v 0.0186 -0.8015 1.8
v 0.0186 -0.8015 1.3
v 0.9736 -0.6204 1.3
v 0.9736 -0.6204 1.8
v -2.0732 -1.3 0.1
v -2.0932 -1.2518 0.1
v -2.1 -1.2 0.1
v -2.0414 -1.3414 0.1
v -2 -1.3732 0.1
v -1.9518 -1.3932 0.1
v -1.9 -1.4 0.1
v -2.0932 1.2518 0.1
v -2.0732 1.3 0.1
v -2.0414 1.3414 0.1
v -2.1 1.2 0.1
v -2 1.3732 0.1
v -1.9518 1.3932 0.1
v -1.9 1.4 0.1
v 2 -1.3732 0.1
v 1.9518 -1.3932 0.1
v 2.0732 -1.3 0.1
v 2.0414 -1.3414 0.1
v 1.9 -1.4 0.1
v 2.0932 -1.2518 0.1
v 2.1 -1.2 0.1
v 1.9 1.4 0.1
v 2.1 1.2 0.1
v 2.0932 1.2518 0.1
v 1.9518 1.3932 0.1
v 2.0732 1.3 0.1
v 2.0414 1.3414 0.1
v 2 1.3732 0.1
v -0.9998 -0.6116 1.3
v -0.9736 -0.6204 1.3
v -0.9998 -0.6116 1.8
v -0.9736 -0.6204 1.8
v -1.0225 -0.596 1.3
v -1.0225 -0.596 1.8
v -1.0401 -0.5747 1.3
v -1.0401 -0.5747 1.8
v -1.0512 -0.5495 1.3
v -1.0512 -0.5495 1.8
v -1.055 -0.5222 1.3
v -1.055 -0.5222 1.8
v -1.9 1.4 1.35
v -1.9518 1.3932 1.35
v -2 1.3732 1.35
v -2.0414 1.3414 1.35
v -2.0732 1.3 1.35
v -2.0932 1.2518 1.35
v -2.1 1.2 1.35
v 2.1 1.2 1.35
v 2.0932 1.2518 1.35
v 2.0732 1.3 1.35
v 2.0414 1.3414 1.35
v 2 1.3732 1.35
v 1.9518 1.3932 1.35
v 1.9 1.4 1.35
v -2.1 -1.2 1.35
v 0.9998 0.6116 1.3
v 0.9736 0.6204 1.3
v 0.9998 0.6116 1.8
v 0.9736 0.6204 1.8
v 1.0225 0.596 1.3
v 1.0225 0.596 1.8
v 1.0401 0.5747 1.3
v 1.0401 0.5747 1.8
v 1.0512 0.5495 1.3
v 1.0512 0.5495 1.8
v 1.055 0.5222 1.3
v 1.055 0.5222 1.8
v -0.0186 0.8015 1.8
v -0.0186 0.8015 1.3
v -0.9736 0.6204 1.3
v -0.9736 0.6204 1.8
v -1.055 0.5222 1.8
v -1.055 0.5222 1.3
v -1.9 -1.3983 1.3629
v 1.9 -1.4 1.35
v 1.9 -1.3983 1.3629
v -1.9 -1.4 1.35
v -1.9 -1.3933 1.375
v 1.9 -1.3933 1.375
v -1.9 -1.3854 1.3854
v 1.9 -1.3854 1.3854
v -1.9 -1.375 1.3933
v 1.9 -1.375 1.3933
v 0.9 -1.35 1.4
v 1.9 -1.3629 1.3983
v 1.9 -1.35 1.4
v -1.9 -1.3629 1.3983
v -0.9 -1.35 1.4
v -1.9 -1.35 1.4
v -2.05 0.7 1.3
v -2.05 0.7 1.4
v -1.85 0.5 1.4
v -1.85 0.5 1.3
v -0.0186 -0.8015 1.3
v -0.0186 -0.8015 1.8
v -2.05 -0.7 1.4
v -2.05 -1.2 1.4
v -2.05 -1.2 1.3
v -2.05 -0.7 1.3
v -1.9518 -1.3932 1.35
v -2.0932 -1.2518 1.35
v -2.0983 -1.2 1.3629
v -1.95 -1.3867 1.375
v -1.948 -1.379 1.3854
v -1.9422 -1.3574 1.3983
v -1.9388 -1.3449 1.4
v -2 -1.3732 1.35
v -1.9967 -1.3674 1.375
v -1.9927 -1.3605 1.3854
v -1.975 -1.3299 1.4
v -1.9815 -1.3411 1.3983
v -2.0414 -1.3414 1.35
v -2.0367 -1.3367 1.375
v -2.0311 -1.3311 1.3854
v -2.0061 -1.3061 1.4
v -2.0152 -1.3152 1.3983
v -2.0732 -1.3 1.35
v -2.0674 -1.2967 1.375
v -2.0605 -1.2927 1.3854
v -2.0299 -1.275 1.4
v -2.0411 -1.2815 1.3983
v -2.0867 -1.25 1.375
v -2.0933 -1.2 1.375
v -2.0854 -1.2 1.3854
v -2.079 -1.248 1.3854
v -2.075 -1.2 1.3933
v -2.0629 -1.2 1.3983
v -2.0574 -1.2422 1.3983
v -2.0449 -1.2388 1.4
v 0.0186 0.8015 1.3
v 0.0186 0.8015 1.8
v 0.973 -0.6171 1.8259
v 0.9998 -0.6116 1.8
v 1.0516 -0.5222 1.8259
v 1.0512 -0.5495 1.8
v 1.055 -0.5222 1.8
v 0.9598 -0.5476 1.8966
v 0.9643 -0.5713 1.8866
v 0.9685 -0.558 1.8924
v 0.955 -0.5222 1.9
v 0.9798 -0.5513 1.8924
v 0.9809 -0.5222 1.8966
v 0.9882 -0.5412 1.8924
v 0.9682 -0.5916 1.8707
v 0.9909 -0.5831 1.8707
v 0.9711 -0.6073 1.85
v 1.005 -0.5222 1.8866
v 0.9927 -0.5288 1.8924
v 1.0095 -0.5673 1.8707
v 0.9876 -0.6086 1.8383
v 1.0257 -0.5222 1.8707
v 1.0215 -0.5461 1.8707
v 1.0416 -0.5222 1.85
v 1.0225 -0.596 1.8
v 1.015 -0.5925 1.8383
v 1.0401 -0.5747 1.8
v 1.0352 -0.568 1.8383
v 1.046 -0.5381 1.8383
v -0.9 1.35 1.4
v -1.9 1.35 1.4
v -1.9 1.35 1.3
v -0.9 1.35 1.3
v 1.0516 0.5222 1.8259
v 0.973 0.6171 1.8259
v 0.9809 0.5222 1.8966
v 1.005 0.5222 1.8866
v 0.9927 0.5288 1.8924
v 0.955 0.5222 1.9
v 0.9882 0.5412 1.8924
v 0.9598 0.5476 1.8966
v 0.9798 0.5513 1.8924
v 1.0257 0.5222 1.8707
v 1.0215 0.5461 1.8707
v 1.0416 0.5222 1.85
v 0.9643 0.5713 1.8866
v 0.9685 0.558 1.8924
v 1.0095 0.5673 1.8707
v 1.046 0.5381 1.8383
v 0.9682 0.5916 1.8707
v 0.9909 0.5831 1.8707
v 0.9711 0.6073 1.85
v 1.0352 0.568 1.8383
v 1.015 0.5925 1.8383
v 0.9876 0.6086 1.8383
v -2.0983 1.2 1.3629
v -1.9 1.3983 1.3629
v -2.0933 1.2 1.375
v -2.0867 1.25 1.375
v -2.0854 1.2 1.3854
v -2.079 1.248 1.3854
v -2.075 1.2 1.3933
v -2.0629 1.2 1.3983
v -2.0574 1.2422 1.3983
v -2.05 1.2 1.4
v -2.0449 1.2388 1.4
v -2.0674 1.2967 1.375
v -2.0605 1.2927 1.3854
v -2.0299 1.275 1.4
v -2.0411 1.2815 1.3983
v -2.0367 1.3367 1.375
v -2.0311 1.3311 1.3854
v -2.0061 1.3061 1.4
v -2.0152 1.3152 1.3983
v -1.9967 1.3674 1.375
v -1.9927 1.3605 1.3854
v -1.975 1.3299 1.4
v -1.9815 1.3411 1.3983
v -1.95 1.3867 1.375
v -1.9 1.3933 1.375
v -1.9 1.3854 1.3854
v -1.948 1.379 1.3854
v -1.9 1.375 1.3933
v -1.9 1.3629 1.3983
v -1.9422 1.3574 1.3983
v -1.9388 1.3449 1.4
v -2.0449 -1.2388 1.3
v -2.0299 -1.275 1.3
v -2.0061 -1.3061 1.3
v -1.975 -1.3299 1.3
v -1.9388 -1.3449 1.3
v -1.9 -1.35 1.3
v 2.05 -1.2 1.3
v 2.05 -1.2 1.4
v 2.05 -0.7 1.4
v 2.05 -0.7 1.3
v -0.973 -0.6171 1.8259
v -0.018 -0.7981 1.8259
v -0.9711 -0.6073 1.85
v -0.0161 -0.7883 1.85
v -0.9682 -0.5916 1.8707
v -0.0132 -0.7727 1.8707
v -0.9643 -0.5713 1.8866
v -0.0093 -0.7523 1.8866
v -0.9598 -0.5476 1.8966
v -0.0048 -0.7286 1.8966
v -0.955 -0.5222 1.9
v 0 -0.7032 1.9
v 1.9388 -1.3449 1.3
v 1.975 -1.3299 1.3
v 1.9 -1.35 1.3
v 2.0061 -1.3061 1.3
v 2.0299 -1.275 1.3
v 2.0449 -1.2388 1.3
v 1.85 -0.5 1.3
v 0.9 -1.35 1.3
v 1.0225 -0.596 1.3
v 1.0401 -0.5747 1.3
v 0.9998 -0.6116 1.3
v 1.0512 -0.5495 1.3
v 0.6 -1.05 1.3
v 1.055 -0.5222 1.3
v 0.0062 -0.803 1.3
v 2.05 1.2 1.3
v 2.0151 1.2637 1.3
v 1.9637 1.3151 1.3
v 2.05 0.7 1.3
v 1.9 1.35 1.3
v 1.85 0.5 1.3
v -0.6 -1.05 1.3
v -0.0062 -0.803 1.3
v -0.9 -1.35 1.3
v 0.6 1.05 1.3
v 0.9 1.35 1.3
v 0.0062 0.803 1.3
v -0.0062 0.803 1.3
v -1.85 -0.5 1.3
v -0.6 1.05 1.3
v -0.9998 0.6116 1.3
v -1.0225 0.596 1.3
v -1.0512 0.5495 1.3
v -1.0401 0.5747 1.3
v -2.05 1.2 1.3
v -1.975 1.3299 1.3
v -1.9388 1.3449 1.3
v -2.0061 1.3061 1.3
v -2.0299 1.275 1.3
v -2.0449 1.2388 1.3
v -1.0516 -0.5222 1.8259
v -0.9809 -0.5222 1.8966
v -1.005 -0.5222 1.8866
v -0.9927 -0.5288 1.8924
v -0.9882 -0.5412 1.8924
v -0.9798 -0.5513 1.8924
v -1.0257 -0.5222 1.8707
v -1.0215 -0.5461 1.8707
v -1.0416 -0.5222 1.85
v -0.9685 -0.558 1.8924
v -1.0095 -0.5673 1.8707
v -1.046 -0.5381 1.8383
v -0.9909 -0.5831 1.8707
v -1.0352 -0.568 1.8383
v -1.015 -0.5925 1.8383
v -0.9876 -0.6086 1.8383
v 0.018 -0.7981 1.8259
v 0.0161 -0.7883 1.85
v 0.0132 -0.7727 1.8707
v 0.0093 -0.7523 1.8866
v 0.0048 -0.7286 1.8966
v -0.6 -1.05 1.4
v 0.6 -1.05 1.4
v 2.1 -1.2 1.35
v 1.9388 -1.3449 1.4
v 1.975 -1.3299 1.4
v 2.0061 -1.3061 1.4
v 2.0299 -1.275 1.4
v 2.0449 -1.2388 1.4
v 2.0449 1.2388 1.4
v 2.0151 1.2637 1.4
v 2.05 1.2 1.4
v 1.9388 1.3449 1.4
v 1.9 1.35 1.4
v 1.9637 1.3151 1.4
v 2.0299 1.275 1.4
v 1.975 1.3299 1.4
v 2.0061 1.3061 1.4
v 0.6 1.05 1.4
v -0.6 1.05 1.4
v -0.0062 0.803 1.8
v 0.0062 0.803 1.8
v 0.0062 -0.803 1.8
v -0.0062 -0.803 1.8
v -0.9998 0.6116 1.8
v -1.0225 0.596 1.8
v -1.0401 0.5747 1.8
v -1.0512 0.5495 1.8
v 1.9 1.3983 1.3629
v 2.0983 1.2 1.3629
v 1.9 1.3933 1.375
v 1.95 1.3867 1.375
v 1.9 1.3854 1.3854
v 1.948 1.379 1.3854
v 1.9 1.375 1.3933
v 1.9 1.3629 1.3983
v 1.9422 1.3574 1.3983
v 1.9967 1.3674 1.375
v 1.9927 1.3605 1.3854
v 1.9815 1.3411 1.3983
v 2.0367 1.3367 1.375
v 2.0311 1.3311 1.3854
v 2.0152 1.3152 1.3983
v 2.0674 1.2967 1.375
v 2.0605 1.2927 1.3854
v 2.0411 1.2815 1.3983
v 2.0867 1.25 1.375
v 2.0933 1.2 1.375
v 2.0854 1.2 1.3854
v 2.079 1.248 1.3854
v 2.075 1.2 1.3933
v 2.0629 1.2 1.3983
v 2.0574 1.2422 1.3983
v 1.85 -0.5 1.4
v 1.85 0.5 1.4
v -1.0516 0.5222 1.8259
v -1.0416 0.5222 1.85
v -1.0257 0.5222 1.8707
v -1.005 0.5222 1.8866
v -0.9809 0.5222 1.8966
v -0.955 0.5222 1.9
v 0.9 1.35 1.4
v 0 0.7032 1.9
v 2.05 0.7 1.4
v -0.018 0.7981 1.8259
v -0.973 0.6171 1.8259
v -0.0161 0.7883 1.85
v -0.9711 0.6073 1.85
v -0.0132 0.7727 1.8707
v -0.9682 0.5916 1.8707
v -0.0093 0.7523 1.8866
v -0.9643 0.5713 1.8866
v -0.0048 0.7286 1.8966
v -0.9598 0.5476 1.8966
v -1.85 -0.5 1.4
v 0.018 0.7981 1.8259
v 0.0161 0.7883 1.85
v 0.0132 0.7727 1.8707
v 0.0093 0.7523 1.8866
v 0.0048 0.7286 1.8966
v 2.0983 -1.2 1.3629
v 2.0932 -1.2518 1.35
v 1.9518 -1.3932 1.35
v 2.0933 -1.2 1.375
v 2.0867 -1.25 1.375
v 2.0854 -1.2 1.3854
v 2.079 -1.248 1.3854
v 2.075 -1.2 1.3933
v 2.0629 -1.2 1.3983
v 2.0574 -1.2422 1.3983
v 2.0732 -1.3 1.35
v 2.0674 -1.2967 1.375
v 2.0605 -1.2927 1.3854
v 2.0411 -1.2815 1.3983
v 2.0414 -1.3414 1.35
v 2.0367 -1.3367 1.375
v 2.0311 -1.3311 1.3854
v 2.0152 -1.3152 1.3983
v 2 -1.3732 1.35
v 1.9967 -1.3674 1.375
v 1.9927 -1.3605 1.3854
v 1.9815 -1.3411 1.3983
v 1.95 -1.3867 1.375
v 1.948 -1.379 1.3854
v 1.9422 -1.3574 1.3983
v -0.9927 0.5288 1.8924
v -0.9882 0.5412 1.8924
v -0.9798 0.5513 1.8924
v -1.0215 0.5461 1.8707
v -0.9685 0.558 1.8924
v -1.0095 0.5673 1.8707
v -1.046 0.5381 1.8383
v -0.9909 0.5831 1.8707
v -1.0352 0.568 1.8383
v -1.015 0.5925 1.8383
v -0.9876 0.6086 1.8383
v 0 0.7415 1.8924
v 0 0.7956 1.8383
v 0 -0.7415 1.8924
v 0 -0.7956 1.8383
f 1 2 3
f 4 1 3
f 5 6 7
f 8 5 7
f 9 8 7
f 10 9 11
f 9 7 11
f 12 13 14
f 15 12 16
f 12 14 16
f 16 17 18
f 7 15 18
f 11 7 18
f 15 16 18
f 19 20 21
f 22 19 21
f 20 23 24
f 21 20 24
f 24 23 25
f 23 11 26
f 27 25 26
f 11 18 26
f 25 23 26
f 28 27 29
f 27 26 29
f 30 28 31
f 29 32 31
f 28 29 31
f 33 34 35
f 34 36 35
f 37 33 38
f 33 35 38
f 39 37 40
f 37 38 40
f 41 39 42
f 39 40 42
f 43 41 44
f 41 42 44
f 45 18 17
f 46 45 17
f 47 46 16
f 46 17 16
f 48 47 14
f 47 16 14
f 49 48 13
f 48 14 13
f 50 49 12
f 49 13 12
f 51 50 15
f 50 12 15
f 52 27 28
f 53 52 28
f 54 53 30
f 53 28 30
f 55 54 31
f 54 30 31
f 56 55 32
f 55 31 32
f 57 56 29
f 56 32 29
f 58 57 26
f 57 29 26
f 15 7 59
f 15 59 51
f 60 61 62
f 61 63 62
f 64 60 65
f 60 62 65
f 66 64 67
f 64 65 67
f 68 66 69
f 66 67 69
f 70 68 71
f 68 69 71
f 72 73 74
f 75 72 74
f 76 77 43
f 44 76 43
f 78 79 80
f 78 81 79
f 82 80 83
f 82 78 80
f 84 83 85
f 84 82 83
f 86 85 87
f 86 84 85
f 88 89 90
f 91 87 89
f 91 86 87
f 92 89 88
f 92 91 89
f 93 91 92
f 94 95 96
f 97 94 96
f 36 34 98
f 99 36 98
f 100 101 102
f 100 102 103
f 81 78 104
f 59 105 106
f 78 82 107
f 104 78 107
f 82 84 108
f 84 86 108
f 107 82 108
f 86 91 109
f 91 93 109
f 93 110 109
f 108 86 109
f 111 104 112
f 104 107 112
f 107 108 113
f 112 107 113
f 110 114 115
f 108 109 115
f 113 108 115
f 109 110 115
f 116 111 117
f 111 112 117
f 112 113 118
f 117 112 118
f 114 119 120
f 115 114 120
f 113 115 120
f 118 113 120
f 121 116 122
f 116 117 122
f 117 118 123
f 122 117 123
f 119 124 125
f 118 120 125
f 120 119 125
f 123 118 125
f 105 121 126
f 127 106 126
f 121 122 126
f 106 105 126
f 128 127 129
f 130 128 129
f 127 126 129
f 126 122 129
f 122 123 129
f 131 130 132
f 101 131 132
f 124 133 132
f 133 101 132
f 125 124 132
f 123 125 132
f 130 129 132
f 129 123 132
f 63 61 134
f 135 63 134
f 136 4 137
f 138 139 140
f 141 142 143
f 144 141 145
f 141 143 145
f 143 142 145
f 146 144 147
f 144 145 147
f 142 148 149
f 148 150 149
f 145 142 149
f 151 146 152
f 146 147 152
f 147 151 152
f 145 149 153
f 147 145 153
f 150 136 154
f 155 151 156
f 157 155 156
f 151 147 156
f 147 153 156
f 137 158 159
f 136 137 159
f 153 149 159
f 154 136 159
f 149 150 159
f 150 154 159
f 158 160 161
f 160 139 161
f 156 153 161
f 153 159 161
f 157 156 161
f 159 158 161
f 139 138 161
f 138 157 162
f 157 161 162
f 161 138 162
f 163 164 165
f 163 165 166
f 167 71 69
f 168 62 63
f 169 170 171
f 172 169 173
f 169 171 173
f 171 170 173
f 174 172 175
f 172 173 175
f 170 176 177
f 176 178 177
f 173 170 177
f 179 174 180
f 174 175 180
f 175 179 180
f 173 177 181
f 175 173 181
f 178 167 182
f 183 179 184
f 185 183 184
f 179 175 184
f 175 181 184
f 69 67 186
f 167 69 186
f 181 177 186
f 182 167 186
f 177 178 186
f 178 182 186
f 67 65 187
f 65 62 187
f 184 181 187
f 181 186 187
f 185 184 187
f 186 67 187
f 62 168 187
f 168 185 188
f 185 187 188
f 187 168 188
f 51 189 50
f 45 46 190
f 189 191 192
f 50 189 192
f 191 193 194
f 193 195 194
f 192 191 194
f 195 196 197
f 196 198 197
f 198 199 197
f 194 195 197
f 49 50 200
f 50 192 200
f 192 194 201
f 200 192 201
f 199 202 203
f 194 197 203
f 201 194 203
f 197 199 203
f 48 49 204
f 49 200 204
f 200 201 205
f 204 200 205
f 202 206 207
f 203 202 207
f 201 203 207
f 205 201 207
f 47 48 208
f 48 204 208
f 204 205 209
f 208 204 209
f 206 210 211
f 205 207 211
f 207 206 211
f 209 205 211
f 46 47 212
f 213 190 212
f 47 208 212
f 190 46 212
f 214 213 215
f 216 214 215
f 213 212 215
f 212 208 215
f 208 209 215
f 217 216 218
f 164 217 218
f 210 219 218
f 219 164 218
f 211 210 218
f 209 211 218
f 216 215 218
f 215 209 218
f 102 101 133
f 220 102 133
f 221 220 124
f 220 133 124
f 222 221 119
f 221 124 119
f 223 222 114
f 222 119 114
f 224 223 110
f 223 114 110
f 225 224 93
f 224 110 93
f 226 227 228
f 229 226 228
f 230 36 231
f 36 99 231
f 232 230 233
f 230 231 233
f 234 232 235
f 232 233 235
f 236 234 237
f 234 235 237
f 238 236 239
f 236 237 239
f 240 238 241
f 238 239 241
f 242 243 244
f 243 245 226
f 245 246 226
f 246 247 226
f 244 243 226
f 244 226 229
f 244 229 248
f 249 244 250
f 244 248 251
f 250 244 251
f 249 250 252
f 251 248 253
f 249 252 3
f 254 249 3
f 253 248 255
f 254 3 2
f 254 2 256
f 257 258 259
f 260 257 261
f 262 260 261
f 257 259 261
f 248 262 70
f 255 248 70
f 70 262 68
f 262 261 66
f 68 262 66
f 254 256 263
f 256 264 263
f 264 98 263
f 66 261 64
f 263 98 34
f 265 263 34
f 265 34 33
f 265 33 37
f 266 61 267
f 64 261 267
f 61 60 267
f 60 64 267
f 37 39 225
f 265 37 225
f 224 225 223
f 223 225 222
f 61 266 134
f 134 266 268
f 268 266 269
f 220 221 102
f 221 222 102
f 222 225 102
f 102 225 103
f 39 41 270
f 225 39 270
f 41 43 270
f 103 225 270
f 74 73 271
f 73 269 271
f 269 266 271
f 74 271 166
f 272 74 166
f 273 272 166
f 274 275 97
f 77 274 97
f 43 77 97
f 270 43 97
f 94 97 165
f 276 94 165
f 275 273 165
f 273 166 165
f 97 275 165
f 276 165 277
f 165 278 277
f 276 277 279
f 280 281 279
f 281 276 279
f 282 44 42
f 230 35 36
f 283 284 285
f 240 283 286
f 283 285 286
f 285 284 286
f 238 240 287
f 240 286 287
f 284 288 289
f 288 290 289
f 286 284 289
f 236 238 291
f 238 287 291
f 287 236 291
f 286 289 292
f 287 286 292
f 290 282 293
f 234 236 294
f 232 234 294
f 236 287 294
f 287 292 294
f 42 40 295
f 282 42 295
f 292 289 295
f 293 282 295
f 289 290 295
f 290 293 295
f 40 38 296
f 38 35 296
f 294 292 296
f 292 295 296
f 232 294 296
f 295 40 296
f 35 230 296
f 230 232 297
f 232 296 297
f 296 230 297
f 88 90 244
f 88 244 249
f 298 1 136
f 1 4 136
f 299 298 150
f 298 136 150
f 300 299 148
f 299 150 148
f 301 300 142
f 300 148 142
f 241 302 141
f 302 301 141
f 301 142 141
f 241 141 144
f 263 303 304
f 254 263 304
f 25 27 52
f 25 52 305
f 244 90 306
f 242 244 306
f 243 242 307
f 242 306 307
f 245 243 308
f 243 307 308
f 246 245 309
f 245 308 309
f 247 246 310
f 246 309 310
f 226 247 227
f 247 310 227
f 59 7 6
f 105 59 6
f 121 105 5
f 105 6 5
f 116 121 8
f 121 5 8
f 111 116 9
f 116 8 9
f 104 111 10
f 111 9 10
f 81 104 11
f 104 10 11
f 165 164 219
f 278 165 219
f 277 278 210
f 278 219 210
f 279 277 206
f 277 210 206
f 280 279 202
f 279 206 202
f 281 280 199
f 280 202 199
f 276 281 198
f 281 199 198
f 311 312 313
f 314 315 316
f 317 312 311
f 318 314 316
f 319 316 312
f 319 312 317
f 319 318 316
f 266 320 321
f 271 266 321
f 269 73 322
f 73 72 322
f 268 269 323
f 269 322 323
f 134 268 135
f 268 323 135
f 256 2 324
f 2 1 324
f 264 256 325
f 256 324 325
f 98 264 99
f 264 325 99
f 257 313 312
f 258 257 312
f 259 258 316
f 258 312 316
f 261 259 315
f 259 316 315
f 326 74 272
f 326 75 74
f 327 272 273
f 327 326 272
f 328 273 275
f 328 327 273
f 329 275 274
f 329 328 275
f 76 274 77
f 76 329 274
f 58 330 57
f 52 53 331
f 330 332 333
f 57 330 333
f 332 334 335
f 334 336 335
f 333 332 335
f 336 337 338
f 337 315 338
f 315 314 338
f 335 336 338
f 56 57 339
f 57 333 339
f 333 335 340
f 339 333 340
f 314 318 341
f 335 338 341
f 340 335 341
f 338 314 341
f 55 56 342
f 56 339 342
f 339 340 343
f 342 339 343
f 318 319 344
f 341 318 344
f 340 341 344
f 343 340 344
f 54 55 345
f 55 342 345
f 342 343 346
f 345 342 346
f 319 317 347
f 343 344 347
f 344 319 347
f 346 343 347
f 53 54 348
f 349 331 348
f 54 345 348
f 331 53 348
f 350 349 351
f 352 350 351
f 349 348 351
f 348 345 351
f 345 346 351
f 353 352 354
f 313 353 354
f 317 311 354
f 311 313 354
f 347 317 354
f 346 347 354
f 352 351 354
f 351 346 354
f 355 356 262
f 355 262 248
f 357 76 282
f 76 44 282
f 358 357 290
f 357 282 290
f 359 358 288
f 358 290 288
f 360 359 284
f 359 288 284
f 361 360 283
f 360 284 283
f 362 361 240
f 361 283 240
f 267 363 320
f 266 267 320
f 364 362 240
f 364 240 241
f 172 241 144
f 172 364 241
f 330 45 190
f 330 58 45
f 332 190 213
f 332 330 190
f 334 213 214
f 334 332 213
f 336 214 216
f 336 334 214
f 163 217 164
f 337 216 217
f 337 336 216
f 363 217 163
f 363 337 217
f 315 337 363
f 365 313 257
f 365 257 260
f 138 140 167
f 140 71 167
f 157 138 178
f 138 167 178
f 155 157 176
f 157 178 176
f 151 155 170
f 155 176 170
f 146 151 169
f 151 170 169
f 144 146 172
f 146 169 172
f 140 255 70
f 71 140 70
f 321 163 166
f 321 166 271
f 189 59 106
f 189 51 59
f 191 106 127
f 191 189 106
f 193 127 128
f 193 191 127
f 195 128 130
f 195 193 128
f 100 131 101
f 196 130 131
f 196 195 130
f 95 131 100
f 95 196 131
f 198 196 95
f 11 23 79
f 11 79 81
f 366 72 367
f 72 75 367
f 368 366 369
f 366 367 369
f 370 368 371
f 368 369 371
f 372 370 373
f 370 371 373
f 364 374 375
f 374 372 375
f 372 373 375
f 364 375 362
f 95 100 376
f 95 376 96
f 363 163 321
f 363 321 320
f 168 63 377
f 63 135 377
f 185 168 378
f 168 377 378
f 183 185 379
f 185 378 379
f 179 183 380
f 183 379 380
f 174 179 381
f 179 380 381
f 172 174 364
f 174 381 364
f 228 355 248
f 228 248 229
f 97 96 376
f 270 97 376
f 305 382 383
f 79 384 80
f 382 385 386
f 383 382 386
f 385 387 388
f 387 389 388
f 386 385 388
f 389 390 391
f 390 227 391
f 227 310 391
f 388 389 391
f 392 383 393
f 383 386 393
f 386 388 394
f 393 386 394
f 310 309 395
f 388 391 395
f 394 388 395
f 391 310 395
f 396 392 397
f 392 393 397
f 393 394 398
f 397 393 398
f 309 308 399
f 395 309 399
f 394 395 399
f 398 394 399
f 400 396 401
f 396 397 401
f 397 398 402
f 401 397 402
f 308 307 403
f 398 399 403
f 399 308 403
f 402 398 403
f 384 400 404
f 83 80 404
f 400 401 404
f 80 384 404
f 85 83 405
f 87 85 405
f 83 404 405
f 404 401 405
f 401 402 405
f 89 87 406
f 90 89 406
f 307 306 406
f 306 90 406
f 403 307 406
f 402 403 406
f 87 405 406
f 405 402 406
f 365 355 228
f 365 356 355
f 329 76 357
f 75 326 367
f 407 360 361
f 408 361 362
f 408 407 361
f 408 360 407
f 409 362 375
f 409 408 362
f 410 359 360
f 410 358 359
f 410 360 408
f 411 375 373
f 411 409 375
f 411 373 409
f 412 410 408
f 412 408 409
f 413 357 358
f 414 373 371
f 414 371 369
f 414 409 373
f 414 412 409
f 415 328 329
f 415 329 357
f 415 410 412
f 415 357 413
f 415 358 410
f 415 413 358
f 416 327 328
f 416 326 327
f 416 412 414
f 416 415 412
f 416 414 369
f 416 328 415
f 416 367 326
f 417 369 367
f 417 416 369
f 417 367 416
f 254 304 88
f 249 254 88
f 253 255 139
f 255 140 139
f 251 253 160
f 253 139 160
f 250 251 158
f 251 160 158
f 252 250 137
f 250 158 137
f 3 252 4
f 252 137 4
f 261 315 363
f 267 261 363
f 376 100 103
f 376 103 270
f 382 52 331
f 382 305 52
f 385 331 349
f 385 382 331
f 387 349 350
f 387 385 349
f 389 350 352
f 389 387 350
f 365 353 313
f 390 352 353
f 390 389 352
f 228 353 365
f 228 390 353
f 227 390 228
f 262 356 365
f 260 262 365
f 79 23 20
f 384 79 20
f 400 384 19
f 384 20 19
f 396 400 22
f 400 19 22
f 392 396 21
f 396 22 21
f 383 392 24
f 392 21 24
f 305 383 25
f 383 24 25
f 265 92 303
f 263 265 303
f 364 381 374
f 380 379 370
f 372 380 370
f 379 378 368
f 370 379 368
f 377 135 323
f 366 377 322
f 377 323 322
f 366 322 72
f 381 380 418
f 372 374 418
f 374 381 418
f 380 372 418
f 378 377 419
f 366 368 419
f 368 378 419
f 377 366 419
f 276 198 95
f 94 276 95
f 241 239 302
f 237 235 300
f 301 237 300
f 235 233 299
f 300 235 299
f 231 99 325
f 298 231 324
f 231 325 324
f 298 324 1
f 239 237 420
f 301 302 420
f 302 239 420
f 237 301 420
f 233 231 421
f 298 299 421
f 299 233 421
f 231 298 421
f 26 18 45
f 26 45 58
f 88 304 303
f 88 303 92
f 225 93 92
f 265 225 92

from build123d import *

# Parameters (mm, degrees)
PAD001_DEPTH = 1.3
FILLET_R     = 0.05
POCKET_DEPTH = 0.1
PAD003_DEPTH = 0.6
FILLET002_R  = 0.1


with BuildPart() as part:
    # Sketch001 (on Face14 of Binder) → Pad001 (new body)
    with BuildSketch(Plane.XY.offset(0.1)):
        with BuildLine():
            ThreePointArc((-1.9, 1.4), (-2.041421, 1.341421), (-2.1, 1.2))
            Line((-2.1, -1.2), (-2.1, 1.2))
            ThreePointArc((-2.1, -1.2), (-2.041421, -1.341421), (-1.9, -1.4))
            Line((1.9, -1.4), (-1.9, -1.4))
            ThreePointArc((1.9, -1.4), (2.041421, -1.341421), (2.1, -1.2))
            Line((2.1, 1.2), (2.1, -1.2))
            ThreePointArc((2.1, 1.2), (2.041421, 1.341421), (1.9, 1.4))
            Line((-1.9, 1.4), (1.9, 1.4))
        make_face()
    extrude(amount=PAD001_DEPTH)

    # Fillet
    fillet_edges = [part.edges().sort_by_distance(p)[0] for p in [
        (0, -1.4, 1.4),
    ]]
    fillet(fillet_edges, radius=FILLET_R)

    # Sketch002 (on Face9 of Fillet) → Pocket (cut)
    with BuildSketch(Plane.XY.offset(1.4)):
        with BuildLine():
            Line((-1.9, 1.35), (-0.9, 1.35))
            Line((-0.9, 1.35), (-0.6, 1.05))
            Line((0.6, 1.05), (-0.6, 1.05))
            Line((0.9, 1.35), (0.6, 1.05))
            Line((1.9, 1.35), (0.9, 1.35))
            ThreePointArc((2.05, 1.2), (1.991264, 1.291264), (1.9, 1.35))
            Line((2.05, 1.2), (2.05, 0.7))
            Line((1.85, 0.5), (2.05, 0.7))
            Line((1.85, 0.5), (1.85, -0.5))
            Line((1.85, -0.5), (2.05, -0.7))
            Line((2.05, -1.2), (2.05, -0.7))
            ThreePointArc((1.9, -1.35), (2.006066, -1.306066), (2.05, -1.2))
            Line((1.9, -1.35), (0.9, -1.35))
            Line((0.6, -1.05), (0.9, -1.35))
            Line((-0.6, -1.05), (0.6, -1.05))
            Line((-0.9, -1.35), (-0.6, -1.05))
            Line((-1.9, -1.35), (-0.9, -1.35))
            ThreePointArc((-2.05, -1.2), (-2.006066, -1.306066), (-1.9, -1.35))
            Line((-2.05, -1.2), (-2.05, -0.7))
            Line((-2.05, -0.7), (-1.85, -0.5))
            Line((-1.85, 0.5), (-1.85, -0.5))
            Line((-2.05, 0.7), (-1.85, 0.5))
            Line((-2.05, 1.2), (-2.05, 0.7))
            ThreePointArc((-1.9, 1.35), (-2.006066, 1.306066), (-2.05, 1.2))
        make_face()
    extrude(amount=-POCKET_DEPTH, mode=Mode.SUBTRACT)

    # Sketch004 (on Face22 of Pocket) → Pad003 (join)
    with BuildSketch(Plane.XY.offset(1.3)):
        Polygon((-1.055, 0.605), (-1.055, -0.605), (0, -0.805), (1.055, -0.605), (1.055, 0.605), (0, 0.805), align=None)
    extrude(amount=PAD003_DEPTH)

    # Fillet002
    fillet002_edges = [part.edges().sort_by_distance(p)[0] for p in [
        (-1.055, 0.605, 1.6),
        (-1.055, 0, 1.9),
        (-0.5275, 0.705, 1.9),
        (0, 0.805, 1.6),
        (0.5275, 0.705, 1.9),
        (1.055, 0.605, 1.6),
        (1.055, 0, 1.9),
        (1.055, -0.605, 1.6),
        (-0.5275, -0.705, 1.9),
        (0.5275, -0.705, 1.9),
        (0, -0.805, 1.6),
        (-1.055, -0.605, 1.6),
    ]]
    fillet(fillet002_edges, radius=FILLET002_R)


solid = part.part
